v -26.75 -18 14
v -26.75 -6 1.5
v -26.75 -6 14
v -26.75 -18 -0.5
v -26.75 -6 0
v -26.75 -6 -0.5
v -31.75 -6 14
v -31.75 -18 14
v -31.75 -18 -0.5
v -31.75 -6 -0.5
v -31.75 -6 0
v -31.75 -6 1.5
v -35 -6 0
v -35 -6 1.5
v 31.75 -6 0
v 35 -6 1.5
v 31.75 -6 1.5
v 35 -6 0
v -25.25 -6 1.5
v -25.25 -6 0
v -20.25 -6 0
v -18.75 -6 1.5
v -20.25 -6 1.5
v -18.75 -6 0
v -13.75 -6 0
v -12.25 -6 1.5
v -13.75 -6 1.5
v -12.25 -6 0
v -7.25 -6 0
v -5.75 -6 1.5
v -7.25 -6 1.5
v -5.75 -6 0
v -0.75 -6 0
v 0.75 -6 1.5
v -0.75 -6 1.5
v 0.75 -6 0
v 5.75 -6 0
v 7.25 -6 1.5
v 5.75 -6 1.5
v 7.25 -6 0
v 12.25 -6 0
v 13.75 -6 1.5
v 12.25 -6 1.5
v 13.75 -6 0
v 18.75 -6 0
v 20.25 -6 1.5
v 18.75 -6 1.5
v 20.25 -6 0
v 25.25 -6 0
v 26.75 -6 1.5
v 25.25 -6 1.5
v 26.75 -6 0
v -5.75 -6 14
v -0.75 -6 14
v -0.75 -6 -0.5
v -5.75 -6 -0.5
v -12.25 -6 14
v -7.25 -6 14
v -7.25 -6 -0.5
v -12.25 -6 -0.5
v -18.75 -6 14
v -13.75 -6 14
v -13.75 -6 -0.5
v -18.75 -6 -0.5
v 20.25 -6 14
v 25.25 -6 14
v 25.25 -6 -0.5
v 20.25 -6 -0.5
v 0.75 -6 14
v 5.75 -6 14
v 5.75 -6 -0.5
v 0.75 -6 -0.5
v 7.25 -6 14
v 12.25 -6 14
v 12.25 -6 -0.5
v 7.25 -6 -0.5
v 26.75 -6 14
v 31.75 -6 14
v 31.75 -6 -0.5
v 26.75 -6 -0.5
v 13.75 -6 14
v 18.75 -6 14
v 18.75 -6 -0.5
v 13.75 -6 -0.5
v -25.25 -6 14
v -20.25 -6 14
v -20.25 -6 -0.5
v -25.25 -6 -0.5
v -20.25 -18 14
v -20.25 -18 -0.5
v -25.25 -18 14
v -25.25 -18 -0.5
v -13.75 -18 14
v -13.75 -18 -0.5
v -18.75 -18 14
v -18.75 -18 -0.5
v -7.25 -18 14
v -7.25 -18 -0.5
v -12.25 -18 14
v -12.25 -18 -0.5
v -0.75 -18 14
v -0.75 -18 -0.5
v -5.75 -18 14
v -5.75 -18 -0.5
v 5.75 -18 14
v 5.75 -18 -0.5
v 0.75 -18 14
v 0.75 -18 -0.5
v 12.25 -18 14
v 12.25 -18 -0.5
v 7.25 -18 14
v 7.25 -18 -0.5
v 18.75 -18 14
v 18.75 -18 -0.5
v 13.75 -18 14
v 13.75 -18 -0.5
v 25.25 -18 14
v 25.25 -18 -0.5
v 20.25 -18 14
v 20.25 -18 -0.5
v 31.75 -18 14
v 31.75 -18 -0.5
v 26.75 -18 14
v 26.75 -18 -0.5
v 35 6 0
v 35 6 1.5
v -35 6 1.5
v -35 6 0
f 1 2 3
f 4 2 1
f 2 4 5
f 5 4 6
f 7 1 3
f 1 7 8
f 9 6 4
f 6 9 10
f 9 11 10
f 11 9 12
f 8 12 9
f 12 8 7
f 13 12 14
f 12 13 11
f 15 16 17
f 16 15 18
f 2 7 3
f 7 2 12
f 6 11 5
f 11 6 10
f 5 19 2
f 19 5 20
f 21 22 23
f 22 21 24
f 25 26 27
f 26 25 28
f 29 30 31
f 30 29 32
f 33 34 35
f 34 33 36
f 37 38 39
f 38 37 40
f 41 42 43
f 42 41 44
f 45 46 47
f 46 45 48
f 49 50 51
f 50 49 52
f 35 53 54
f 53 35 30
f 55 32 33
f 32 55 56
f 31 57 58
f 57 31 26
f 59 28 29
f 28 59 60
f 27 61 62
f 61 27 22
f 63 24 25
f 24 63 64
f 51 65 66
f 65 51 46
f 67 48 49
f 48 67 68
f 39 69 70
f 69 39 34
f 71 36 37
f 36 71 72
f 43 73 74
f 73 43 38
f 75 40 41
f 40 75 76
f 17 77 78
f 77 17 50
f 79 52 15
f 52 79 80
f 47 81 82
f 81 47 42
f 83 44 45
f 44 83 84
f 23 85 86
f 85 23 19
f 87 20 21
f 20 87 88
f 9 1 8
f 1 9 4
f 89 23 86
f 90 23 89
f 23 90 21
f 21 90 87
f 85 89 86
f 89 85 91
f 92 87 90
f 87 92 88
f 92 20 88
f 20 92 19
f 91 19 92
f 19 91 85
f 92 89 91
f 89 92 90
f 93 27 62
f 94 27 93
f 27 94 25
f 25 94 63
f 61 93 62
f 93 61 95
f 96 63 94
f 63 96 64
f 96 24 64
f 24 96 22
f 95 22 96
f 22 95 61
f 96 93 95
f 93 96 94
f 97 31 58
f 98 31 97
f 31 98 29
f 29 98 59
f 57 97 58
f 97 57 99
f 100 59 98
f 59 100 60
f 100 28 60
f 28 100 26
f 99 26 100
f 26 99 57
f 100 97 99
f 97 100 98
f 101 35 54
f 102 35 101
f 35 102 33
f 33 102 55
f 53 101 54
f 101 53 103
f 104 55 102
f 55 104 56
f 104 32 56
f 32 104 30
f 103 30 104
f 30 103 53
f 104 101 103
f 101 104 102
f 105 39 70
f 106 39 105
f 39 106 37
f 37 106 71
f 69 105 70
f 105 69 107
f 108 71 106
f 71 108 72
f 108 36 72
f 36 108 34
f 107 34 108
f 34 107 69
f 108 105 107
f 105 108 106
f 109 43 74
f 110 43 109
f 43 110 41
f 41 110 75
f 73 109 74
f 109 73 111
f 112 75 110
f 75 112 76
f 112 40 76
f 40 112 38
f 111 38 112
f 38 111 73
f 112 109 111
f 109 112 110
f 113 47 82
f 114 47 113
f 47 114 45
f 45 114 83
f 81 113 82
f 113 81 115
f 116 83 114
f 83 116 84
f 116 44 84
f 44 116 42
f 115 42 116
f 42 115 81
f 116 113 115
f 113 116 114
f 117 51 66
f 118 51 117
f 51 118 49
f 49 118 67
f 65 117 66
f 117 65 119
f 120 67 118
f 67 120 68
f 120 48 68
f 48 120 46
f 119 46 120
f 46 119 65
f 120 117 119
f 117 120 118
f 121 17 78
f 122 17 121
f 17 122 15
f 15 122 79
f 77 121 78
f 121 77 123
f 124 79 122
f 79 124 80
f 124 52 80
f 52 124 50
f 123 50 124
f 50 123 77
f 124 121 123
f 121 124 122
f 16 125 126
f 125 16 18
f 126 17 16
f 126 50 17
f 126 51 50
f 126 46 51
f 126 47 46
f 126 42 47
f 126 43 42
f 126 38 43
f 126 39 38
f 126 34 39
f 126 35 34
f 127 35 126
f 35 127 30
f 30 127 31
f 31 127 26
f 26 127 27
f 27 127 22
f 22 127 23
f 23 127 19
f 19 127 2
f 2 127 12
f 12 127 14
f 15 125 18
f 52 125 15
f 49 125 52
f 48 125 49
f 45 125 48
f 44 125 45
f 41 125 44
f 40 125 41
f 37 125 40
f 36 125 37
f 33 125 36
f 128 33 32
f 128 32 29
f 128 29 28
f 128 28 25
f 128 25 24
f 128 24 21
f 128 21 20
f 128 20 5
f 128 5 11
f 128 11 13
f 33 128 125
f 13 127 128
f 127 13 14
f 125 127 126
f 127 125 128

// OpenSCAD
// 10-well comb for agarose gel casting, printed lying flat
// Units: mm

// ---- Spine ----
spine_len   = 70;   // spine length (X)
spine_wid   = 12;   // spine width (Y)
plate_thk   = 1.5;  // plate thickness (Z)

// ---- Teeth ----
tooth_count = 10;   // number of teeth
tooth_w     = 5.0;  // tooth width (X)
tooth_l     = 12;   // tooth length (Y)
tooth_h     = 12;   // tooth height from spine (Z)
gap         = 1.5;  // gap between teeth (X)

// ---- Derived ----
pitch    = tooth_w + gap;               // centre-to-centre spacing
x_start  = -(tooth_count - 1) * pitch / 2; // first tooth centre (row centred)
eps      = 0.5;                        // cutter overshoot

union() {
    // Spine plate
    translate([-spine_len / 2, -spine_wid / 2, 0])
        cube([spine_len, spine_wid, plate_thk]);

    // Teeth, cut into spine
    for (i = [0 : tooth_count - 1]) {
        translate([x_start + i * pitch - tooth_w / 2,
                   -spine_wid / 2 - tooth_h,
                   -eps])
            cube([tooth_w, tooth_l, plate_thk + tooth_h + 2 * eps]);
    }
}
